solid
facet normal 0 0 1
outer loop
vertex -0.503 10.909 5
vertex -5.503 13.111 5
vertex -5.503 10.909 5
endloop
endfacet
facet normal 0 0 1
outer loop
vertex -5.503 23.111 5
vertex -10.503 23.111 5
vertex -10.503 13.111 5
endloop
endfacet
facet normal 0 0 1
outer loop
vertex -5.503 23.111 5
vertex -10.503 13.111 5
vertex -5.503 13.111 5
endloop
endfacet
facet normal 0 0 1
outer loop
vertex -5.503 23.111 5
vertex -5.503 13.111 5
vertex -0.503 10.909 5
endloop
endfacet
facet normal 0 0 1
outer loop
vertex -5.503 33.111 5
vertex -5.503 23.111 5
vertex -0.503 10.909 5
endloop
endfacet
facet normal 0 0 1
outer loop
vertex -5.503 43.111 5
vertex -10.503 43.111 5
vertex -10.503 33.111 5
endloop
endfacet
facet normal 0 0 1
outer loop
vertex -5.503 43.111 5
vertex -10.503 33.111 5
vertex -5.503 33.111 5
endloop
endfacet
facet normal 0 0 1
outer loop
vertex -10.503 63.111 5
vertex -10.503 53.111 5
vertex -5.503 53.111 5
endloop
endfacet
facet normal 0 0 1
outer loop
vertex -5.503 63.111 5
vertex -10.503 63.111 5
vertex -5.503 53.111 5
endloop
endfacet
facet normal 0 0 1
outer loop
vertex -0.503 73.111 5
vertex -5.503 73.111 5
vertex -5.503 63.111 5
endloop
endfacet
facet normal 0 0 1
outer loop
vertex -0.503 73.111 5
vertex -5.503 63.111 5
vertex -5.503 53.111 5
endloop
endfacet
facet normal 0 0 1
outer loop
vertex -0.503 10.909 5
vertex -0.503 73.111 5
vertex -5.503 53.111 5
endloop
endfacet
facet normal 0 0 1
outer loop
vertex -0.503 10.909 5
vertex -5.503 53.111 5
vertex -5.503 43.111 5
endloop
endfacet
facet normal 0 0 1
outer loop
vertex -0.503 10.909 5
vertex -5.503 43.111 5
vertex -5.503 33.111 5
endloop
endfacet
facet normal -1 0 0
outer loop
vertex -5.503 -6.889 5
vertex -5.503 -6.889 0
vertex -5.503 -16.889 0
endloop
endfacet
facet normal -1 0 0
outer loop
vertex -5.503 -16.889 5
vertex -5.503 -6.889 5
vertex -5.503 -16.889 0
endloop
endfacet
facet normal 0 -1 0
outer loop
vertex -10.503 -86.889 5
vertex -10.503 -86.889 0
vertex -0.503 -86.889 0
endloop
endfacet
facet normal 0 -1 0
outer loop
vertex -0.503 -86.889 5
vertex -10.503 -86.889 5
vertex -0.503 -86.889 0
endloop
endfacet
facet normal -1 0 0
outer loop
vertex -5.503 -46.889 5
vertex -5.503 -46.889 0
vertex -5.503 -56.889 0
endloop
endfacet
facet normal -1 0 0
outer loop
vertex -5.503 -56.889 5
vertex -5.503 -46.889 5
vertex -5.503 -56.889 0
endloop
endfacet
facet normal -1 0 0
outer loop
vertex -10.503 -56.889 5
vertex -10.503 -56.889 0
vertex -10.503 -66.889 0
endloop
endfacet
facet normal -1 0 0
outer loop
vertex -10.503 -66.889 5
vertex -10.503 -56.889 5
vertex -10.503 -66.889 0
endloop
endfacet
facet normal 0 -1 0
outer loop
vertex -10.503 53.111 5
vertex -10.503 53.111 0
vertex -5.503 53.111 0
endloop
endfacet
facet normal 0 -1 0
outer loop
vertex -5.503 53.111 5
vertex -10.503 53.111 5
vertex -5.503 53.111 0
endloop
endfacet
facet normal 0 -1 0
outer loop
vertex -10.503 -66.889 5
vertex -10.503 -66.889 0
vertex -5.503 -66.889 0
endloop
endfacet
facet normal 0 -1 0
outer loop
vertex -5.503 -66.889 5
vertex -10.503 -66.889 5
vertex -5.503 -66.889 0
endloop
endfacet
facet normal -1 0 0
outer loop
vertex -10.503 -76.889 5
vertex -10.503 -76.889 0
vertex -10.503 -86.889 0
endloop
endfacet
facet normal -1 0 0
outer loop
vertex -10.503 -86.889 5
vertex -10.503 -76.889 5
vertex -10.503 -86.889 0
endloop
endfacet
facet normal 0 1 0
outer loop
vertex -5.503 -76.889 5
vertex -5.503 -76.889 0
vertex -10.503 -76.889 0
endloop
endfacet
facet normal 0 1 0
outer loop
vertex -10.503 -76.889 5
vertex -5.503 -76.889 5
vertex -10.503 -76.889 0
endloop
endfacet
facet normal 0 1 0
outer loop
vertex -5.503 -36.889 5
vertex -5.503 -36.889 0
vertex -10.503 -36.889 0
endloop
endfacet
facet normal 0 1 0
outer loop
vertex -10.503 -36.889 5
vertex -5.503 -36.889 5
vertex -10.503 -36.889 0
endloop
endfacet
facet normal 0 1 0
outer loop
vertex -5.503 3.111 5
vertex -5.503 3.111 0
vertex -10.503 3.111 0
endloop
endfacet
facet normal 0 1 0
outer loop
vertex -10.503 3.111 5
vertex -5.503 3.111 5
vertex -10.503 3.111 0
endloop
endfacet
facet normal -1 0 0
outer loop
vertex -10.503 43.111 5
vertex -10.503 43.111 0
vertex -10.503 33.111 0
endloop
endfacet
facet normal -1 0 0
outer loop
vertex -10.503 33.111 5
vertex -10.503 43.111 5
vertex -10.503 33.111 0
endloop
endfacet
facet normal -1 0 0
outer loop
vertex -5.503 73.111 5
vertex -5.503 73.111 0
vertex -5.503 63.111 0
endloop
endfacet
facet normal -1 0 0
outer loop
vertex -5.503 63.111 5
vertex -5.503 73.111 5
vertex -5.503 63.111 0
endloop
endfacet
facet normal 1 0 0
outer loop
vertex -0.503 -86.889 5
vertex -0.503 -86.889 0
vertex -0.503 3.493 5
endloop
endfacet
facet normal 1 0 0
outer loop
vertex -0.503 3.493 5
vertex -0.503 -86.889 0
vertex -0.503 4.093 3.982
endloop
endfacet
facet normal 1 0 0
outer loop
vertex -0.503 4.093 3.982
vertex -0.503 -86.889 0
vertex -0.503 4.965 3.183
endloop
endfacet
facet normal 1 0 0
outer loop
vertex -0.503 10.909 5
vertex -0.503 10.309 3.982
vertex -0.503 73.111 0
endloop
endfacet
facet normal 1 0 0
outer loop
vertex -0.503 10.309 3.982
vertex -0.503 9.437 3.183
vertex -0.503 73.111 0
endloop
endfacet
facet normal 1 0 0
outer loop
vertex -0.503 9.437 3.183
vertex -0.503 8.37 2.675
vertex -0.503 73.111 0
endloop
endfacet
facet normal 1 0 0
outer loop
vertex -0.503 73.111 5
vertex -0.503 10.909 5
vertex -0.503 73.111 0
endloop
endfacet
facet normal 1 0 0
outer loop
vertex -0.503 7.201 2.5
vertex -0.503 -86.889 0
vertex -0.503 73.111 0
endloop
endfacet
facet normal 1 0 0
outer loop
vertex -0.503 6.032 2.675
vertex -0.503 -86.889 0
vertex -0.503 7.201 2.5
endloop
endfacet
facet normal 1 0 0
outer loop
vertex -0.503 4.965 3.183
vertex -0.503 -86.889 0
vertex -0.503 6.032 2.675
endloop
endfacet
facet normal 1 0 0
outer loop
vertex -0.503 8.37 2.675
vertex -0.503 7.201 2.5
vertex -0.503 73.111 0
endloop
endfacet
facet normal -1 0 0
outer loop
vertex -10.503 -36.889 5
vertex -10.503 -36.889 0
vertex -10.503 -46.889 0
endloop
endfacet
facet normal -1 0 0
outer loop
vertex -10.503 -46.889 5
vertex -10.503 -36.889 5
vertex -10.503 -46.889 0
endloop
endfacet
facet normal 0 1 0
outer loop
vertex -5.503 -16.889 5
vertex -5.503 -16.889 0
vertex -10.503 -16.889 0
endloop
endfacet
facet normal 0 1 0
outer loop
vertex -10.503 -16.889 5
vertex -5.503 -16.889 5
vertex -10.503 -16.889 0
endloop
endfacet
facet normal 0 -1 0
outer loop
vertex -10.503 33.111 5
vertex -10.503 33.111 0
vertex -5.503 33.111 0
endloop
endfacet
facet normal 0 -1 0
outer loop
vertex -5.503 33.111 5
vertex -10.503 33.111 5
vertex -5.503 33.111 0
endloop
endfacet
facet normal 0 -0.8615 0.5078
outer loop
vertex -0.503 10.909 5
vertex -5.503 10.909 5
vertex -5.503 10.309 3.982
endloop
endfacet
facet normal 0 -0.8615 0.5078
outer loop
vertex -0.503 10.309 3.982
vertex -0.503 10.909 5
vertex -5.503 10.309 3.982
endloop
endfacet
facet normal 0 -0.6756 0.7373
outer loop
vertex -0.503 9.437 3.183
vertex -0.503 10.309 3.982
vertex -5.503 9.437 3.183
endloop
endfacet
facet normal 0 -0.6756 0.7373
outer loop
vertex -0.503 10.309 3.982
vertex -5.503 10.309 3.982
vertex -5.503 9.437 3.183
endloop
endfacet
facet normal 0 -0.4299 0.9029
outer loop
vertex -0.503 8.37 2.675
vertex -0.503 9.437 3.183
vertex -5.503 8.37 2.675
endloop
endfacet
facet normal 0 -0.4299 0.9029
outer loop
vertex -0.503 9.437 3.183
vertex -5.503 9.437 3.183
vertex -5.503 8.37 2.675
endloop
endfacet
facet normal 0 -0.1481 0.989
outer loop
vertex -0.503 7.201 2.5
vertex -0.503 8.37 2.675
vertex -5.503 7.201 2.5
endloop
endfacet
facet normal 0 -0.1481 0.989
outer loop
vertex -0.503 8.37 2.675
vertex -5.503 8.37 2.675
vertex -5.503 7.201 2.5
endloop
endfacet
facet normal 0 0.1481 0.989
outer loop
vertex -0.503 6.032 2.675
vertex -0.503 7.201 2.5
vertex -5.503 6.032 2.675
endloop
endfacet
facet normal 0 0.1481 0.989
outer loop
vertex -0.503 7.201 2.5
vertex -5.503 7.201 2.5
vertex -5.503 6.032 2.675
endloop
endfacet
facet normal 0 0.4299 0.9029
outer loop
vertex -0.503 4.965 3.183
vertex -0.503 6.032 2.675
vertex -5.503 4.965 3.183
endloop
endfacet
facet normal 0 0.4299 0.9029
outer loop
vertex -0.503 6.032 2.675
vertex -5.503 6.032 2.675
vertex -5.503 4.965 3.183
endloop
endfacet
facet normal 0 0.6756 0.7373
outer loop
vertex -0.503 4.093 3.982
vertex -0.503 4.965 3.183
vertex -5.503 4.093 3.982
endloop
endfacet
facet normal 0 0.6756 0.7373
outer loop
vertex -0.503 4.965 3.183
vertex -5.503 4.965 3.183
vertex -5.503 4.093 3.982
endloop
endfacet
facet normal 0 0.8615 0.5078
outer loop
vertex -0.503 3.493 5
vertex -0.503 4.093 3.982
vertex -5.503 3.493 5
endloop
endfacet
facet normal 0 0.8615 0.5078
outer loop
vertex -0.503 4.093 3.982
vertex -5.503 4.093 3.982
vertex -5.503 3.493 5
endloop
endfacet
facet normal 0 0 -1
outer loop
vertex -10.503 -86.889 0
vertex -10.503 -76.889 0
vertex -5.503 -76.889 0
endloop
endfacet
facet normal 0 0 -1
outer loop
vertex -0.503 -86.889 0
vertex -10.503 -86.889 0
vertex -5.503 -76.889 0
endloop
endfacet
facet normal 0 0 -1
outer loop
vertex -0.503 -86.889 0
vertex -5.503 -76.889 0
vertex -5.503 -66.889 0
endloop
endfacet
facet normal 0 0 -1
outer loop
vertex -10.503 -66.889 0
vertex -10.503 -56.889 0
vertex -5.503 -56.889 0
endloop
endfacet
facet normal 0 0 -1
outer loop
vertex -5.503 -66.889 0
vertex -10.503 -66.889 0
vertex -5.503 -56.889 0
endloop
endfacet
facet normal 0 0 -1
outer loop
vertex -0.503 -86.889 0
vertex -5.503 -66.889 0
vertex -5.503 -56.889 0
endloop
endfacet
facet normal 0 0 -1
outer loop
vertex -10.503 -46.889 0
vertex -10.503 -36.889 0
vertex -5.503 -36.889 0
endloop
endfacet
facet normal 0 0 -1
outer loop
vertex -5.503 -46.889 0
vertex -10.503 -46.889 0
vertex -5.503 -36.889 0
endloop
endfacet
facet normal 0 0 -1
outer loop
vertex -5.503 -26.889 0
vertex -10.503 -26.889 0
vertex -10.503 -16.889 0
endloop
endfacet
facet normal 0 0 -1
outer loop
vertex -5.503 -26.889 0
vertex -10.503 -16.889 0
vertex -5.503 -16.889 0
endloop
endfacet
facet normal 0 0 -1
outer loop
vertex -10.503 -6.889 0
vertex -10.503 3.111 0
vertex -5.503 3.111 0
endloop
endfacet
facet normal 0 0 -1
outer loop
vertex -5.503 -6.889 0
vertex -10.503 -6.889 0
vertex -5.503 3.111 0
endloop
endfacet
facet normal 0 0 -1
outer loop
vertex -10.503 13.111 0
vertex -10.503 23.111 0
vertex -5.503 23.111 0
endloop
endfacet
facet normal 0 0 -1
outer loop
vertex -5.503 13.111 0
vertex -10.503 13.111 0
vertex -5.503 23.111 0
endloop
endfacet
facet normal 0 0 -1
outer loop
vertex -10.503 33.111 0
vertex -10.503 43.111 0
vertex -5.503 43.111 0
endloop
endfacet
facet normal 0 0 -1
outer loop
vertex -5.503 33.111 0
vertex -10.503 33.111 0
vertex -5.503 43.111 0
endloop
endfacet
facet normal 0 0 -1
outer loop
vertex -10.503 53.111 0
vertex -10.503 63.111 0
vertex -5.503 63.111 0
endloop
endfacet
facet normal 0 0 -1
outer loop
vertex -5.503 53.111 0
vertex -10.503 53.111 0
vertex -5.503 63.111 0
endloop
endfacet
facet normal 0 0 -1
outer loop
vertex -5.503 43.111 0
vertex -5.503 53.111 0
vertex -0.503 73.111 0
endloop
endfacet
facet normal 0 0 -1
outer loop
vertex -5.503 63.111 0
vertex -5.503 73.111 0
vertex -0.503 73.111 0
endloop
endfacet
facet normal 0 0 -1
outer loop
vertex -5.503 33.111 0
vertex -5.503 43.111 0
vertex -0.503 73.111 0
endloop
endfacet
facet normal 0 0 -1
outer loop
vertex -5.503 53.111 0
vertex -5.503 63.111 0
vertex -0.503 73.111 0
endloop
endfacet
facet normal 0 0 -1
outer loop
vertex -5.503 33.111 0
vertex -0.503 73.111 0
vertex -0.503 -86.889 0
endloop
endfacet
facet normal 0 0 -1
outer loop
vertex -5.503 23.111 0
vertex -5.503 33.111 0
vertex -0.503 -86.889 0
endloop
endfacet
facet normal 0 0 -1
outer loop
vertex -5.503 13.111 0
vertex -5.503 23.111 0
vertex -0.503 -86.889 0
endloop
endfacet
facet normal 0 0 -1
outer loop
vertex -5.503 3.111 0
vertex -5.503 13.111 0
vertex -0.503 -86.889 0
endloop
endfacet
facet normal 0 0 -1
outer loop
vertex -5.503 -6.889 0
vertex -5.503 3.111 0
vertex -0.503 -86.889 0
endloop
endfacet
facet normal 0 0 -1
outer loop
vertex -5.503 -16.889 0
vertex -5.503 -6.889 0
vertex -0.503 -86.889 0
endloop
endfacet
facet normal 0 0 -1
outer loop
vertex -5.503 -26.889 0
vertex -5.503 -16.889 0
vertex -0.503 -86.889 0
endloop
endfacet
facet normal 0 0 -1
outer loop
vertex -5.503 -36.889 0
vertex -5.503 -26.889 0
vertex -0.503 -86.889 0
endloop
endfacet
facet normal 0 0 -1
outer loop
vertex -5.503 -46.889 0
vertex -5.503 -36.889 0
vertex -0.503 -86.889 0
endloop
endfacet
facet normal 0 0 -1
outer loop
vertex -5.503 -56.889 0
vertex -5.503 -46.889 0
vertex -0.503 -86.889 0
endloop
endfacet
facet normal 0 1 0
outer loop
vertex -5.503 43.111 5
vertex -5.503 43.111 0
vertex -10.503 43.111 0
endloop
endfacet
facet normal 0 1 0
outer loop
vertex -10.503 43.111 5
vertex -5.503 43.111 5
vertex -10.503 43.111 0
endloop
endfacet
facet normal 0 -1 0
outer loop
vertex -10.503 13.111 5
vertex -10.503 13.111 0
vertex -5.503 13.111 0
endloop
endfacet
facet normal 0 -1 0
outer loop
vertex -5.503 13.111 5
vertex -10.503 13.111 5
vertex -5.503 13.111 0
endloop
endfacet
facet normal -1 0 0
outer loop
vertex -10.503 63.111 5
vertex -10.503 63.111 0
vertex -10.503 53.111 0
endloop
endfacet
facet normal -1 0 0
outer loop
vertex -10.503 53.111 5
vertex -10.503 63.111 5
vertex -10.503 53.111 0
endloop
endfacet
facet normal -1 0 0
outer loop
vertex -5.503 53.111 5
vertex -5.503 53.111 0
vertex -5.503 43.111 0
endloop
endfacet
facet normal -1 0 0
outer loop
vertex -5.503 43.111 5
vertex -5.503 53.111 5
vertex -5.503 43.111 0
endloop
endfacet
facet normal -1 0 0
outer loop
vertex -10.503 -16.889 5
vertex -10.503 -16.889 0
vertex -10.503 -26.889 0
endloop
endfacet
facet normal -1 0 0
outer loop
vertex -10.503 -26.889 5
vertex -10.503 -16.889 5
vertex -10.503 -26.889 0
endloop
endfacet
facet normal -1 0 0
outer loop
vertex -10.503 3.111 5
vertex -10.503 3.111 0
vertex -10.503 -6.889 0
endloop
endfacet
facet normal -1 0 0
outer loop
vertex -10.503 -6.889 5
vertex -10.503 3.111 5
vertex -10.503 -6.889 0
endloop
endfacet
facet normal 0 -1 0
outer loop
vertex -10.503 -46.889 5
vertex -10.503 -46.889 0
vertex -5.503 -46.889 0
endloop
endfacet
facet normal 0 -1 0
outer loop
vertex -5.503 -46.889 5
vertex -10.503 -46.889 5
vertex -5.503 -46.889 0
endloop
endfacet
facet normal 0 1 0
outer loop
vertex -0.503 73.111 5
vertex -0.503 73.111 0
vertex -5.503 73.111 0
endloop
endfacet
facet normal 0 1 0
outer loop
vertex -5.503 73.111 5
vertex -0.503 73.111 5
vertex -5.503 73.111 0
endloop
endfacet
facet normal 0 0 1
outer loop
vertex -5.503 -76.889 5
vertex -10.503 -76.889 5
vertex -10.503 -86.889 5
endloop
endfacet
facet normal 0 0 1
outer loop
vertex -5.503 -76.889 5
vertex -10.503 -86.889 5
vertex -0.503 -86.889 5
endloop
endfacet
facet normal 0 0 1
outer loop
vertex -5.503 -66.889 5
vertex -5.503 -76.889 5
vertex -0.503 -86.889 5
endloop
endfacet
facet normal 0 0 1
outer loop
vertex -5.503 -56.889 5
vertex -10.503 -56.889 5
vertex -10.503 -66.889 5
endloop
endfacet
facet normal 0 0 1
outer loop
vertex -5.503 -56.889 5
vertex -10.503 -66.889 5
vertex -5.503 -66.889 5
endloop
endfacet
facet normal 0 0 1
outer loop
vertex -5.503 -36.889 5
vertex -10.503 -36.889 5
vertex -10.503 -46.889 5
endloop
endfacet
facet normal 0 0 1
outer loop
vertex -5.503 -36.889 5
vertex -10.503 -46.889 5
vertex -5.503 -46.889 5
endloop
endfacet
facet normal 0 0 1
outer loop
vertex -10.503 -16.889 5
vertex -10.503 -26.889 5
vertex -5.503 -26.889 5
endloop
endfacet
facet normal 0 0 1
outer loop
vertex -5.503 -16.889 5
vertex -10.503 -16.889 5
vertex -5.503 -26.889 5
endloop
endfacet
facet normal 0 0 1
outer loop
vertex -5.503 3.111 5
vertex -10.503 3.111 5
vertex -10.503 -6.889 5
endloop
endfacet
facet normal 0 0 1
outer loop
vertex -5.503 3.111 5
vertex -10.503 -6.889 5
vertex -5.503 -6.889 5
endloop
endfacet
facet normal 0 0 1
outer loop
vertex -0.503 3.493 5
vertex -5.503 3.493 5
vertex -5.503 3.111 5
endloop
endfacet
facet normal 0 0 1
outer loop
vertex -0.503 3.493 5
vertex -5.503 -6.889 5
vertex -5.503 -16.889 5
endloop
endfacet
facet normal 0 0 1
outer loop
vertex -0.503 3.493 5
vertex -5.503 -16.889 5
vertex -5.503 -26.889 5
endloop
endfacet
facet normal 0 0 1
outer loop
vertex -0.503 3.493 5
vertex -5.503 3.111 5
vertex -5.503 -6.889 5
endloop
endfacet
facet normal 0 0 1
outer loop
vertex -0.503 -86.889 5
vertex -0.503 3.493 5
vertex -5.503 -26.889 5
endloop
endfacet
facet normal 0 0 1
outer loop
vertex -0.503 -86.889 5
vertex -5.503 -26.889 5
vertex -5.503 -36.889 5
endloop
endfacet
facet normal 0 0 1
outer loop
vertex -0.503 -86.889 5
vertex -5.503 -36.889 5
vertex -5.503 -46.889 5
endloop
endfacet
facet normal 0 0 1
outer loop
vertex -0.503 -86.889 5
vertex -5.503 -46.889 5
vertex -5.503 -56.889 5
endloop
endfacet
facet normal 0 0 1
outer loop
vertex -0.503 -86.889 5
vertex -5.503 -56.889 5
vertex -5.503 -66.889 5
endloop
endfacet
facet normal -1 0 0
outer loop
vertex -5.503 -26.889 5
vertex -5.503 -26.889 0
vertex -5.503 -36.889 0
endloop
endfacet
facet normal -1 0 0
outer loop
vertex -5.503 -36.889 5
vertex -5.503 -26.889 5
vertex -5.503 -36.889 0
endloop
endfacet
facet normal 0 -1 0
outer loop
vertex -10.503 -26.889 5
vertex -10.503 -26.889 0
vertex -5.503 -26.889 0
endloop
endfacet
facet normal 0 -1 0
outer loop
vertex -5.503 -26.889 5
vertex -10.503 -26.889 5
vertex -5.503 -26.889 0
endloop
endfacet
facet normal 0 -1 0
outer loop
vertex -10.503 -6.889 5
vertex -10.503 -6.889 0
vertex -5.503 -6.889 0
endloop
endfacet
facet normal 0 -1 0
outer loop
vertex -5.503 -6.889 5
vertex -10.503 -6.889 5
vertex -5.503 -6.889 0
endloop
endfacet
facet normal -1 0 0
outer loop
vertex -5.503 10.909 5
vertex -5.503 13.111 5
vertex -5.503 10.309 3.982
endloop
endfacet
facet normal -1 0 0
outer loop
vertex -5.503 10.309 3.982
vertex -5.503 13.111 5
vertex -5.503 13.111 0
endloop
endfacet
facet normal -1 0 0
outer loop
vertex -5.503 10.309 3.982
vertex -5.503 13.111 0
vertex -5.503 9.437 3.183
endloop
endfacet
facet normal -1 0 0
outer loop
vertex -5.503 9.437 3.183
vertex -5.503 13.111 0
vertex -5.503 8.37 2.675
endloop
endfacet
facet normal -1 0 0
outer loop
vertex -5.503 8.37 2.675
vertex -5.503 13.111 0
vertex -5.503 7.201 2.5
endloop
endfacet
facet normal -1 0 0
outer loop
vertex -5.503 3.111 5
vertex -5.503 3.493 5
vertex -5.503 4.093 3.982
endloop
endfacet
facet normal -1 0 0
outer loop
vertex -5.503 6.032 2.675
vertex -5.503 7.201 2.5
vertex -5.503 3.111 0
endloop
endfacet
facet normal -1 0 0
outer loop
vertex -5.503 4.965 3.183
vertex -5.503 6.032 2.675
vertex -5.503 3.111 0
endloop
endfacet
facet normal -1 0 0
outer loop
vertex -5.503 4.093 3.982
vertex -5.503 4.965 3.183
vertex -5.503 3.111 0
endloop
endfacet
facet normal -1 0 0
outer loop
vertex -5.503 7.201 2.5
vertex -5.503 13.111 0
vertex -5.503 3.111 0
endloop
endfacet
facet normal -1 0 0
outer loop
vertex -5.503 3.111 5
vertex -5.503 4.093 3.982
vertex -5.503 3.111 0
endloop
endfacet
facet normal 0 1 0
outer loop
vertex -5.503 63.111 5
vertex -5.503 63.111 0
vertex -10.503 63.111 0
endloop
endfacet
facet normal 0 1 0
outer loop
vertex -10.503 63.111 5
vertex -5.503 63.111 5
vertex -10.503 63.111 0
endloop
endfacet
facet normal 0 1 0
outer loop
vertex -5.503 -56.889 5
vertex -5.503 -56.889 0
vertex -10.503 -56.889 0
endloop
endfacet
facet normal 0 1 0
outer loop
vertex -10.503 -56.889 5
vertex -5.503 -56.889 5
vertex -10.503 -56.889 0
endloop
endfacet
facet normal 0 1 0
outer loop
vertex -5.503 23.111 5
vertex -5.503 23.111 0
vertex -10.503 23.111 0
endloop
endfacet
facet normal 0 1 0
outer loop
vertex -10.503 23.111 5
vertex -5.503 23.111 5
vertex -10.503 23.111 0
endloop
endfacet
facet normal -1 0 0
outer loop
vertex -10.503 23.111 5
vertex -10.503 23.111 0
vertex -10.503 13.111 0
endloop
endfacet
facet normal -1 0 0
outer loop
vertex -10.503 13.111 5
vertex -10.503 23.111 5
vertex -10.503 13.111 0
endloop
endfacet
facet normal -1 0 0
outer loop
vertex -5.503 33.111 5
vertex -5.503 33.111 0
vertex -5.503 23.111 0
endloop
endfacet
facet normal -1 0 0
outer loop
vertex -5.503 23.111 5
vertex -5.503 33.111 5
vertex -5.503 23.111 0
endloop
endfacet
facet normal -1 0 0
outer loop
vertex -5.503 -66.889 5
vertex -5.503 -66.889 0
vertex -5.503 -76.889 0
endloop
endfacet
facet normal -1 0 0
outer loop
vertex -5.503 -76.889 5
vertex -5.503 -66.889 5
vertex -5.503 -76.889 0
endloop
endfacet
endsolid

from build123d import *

# Parameters (mm, degrees)
SALIENTE_EXTRUIR1_DEPTH = 5
CROQUIS3_R              = 4
CORTAR_EXTRUIR1_DEPTH   = 5


with BuildPart() as part:
    # Croquis1 → Saliente-Extruir1 (new body)
    with BuildSketch(Plane.XY):
        Polygon((-10.50310955, 63.111111111), (-10.50310955, 53.111111111), (-5.50310955, 53.111111111), (-5.50310955, 43.111111111), (-10.50310955, 43.111111111), (-10.50310955, 33.111111111), (-5.50310955, 33.111111111), (-5.50310955, 23.111111111), (-10.50310955, 23.111111111), (-10.50310955, 13.111111111), (-5.50310955, 13.111111111), (-5.50310955, 3.111111111), (-10.50310955, 3.111111111), (-10.50310955, -6.888888889), (-5.50310955, -6.888888889), (-5.50310955, -16.888888889), (-10.50310955, -16.888888889), (-10.50310955, -26.888888889), (-5.50310955, -26.888888889), (-5.50310955, -36.888888889), (-10.50310955, -36.888888889), (-10.50310955, -46.888888889), (-5.50310955, -46.888888889), (-5.50310955, -56.888888889), (-10.50310955, -56.888888889), (-10.50310955, -66.888888889), (-5.50310955, -66.888888889), (-5.50310955, -76.888888889), (-10.50310955, -76.888888889), (-10.50310955, -86.888888889), (-0.50310955, -86.888888889), (-0.50310955, 73.111111111), (-5.50310955, 73.111111111), (-5.50310955, 63.111111111), align=None)
    extrude(amount=SALIENTE_EXTRUIR1_DEPTH)

    # Croquis3 → Cortar-Extruir1 (cut)
    with BuildSketch(Plane.ZY.offset(5.50310955)):
        with Locations((6.5, 7.201111111)):
            Circle(CROQUIS3_R)
    extrude(amount=-CORTAR_EXTRUIR1_DEPTH, mode=Mode.SUBTRACT)


solid = part.part
